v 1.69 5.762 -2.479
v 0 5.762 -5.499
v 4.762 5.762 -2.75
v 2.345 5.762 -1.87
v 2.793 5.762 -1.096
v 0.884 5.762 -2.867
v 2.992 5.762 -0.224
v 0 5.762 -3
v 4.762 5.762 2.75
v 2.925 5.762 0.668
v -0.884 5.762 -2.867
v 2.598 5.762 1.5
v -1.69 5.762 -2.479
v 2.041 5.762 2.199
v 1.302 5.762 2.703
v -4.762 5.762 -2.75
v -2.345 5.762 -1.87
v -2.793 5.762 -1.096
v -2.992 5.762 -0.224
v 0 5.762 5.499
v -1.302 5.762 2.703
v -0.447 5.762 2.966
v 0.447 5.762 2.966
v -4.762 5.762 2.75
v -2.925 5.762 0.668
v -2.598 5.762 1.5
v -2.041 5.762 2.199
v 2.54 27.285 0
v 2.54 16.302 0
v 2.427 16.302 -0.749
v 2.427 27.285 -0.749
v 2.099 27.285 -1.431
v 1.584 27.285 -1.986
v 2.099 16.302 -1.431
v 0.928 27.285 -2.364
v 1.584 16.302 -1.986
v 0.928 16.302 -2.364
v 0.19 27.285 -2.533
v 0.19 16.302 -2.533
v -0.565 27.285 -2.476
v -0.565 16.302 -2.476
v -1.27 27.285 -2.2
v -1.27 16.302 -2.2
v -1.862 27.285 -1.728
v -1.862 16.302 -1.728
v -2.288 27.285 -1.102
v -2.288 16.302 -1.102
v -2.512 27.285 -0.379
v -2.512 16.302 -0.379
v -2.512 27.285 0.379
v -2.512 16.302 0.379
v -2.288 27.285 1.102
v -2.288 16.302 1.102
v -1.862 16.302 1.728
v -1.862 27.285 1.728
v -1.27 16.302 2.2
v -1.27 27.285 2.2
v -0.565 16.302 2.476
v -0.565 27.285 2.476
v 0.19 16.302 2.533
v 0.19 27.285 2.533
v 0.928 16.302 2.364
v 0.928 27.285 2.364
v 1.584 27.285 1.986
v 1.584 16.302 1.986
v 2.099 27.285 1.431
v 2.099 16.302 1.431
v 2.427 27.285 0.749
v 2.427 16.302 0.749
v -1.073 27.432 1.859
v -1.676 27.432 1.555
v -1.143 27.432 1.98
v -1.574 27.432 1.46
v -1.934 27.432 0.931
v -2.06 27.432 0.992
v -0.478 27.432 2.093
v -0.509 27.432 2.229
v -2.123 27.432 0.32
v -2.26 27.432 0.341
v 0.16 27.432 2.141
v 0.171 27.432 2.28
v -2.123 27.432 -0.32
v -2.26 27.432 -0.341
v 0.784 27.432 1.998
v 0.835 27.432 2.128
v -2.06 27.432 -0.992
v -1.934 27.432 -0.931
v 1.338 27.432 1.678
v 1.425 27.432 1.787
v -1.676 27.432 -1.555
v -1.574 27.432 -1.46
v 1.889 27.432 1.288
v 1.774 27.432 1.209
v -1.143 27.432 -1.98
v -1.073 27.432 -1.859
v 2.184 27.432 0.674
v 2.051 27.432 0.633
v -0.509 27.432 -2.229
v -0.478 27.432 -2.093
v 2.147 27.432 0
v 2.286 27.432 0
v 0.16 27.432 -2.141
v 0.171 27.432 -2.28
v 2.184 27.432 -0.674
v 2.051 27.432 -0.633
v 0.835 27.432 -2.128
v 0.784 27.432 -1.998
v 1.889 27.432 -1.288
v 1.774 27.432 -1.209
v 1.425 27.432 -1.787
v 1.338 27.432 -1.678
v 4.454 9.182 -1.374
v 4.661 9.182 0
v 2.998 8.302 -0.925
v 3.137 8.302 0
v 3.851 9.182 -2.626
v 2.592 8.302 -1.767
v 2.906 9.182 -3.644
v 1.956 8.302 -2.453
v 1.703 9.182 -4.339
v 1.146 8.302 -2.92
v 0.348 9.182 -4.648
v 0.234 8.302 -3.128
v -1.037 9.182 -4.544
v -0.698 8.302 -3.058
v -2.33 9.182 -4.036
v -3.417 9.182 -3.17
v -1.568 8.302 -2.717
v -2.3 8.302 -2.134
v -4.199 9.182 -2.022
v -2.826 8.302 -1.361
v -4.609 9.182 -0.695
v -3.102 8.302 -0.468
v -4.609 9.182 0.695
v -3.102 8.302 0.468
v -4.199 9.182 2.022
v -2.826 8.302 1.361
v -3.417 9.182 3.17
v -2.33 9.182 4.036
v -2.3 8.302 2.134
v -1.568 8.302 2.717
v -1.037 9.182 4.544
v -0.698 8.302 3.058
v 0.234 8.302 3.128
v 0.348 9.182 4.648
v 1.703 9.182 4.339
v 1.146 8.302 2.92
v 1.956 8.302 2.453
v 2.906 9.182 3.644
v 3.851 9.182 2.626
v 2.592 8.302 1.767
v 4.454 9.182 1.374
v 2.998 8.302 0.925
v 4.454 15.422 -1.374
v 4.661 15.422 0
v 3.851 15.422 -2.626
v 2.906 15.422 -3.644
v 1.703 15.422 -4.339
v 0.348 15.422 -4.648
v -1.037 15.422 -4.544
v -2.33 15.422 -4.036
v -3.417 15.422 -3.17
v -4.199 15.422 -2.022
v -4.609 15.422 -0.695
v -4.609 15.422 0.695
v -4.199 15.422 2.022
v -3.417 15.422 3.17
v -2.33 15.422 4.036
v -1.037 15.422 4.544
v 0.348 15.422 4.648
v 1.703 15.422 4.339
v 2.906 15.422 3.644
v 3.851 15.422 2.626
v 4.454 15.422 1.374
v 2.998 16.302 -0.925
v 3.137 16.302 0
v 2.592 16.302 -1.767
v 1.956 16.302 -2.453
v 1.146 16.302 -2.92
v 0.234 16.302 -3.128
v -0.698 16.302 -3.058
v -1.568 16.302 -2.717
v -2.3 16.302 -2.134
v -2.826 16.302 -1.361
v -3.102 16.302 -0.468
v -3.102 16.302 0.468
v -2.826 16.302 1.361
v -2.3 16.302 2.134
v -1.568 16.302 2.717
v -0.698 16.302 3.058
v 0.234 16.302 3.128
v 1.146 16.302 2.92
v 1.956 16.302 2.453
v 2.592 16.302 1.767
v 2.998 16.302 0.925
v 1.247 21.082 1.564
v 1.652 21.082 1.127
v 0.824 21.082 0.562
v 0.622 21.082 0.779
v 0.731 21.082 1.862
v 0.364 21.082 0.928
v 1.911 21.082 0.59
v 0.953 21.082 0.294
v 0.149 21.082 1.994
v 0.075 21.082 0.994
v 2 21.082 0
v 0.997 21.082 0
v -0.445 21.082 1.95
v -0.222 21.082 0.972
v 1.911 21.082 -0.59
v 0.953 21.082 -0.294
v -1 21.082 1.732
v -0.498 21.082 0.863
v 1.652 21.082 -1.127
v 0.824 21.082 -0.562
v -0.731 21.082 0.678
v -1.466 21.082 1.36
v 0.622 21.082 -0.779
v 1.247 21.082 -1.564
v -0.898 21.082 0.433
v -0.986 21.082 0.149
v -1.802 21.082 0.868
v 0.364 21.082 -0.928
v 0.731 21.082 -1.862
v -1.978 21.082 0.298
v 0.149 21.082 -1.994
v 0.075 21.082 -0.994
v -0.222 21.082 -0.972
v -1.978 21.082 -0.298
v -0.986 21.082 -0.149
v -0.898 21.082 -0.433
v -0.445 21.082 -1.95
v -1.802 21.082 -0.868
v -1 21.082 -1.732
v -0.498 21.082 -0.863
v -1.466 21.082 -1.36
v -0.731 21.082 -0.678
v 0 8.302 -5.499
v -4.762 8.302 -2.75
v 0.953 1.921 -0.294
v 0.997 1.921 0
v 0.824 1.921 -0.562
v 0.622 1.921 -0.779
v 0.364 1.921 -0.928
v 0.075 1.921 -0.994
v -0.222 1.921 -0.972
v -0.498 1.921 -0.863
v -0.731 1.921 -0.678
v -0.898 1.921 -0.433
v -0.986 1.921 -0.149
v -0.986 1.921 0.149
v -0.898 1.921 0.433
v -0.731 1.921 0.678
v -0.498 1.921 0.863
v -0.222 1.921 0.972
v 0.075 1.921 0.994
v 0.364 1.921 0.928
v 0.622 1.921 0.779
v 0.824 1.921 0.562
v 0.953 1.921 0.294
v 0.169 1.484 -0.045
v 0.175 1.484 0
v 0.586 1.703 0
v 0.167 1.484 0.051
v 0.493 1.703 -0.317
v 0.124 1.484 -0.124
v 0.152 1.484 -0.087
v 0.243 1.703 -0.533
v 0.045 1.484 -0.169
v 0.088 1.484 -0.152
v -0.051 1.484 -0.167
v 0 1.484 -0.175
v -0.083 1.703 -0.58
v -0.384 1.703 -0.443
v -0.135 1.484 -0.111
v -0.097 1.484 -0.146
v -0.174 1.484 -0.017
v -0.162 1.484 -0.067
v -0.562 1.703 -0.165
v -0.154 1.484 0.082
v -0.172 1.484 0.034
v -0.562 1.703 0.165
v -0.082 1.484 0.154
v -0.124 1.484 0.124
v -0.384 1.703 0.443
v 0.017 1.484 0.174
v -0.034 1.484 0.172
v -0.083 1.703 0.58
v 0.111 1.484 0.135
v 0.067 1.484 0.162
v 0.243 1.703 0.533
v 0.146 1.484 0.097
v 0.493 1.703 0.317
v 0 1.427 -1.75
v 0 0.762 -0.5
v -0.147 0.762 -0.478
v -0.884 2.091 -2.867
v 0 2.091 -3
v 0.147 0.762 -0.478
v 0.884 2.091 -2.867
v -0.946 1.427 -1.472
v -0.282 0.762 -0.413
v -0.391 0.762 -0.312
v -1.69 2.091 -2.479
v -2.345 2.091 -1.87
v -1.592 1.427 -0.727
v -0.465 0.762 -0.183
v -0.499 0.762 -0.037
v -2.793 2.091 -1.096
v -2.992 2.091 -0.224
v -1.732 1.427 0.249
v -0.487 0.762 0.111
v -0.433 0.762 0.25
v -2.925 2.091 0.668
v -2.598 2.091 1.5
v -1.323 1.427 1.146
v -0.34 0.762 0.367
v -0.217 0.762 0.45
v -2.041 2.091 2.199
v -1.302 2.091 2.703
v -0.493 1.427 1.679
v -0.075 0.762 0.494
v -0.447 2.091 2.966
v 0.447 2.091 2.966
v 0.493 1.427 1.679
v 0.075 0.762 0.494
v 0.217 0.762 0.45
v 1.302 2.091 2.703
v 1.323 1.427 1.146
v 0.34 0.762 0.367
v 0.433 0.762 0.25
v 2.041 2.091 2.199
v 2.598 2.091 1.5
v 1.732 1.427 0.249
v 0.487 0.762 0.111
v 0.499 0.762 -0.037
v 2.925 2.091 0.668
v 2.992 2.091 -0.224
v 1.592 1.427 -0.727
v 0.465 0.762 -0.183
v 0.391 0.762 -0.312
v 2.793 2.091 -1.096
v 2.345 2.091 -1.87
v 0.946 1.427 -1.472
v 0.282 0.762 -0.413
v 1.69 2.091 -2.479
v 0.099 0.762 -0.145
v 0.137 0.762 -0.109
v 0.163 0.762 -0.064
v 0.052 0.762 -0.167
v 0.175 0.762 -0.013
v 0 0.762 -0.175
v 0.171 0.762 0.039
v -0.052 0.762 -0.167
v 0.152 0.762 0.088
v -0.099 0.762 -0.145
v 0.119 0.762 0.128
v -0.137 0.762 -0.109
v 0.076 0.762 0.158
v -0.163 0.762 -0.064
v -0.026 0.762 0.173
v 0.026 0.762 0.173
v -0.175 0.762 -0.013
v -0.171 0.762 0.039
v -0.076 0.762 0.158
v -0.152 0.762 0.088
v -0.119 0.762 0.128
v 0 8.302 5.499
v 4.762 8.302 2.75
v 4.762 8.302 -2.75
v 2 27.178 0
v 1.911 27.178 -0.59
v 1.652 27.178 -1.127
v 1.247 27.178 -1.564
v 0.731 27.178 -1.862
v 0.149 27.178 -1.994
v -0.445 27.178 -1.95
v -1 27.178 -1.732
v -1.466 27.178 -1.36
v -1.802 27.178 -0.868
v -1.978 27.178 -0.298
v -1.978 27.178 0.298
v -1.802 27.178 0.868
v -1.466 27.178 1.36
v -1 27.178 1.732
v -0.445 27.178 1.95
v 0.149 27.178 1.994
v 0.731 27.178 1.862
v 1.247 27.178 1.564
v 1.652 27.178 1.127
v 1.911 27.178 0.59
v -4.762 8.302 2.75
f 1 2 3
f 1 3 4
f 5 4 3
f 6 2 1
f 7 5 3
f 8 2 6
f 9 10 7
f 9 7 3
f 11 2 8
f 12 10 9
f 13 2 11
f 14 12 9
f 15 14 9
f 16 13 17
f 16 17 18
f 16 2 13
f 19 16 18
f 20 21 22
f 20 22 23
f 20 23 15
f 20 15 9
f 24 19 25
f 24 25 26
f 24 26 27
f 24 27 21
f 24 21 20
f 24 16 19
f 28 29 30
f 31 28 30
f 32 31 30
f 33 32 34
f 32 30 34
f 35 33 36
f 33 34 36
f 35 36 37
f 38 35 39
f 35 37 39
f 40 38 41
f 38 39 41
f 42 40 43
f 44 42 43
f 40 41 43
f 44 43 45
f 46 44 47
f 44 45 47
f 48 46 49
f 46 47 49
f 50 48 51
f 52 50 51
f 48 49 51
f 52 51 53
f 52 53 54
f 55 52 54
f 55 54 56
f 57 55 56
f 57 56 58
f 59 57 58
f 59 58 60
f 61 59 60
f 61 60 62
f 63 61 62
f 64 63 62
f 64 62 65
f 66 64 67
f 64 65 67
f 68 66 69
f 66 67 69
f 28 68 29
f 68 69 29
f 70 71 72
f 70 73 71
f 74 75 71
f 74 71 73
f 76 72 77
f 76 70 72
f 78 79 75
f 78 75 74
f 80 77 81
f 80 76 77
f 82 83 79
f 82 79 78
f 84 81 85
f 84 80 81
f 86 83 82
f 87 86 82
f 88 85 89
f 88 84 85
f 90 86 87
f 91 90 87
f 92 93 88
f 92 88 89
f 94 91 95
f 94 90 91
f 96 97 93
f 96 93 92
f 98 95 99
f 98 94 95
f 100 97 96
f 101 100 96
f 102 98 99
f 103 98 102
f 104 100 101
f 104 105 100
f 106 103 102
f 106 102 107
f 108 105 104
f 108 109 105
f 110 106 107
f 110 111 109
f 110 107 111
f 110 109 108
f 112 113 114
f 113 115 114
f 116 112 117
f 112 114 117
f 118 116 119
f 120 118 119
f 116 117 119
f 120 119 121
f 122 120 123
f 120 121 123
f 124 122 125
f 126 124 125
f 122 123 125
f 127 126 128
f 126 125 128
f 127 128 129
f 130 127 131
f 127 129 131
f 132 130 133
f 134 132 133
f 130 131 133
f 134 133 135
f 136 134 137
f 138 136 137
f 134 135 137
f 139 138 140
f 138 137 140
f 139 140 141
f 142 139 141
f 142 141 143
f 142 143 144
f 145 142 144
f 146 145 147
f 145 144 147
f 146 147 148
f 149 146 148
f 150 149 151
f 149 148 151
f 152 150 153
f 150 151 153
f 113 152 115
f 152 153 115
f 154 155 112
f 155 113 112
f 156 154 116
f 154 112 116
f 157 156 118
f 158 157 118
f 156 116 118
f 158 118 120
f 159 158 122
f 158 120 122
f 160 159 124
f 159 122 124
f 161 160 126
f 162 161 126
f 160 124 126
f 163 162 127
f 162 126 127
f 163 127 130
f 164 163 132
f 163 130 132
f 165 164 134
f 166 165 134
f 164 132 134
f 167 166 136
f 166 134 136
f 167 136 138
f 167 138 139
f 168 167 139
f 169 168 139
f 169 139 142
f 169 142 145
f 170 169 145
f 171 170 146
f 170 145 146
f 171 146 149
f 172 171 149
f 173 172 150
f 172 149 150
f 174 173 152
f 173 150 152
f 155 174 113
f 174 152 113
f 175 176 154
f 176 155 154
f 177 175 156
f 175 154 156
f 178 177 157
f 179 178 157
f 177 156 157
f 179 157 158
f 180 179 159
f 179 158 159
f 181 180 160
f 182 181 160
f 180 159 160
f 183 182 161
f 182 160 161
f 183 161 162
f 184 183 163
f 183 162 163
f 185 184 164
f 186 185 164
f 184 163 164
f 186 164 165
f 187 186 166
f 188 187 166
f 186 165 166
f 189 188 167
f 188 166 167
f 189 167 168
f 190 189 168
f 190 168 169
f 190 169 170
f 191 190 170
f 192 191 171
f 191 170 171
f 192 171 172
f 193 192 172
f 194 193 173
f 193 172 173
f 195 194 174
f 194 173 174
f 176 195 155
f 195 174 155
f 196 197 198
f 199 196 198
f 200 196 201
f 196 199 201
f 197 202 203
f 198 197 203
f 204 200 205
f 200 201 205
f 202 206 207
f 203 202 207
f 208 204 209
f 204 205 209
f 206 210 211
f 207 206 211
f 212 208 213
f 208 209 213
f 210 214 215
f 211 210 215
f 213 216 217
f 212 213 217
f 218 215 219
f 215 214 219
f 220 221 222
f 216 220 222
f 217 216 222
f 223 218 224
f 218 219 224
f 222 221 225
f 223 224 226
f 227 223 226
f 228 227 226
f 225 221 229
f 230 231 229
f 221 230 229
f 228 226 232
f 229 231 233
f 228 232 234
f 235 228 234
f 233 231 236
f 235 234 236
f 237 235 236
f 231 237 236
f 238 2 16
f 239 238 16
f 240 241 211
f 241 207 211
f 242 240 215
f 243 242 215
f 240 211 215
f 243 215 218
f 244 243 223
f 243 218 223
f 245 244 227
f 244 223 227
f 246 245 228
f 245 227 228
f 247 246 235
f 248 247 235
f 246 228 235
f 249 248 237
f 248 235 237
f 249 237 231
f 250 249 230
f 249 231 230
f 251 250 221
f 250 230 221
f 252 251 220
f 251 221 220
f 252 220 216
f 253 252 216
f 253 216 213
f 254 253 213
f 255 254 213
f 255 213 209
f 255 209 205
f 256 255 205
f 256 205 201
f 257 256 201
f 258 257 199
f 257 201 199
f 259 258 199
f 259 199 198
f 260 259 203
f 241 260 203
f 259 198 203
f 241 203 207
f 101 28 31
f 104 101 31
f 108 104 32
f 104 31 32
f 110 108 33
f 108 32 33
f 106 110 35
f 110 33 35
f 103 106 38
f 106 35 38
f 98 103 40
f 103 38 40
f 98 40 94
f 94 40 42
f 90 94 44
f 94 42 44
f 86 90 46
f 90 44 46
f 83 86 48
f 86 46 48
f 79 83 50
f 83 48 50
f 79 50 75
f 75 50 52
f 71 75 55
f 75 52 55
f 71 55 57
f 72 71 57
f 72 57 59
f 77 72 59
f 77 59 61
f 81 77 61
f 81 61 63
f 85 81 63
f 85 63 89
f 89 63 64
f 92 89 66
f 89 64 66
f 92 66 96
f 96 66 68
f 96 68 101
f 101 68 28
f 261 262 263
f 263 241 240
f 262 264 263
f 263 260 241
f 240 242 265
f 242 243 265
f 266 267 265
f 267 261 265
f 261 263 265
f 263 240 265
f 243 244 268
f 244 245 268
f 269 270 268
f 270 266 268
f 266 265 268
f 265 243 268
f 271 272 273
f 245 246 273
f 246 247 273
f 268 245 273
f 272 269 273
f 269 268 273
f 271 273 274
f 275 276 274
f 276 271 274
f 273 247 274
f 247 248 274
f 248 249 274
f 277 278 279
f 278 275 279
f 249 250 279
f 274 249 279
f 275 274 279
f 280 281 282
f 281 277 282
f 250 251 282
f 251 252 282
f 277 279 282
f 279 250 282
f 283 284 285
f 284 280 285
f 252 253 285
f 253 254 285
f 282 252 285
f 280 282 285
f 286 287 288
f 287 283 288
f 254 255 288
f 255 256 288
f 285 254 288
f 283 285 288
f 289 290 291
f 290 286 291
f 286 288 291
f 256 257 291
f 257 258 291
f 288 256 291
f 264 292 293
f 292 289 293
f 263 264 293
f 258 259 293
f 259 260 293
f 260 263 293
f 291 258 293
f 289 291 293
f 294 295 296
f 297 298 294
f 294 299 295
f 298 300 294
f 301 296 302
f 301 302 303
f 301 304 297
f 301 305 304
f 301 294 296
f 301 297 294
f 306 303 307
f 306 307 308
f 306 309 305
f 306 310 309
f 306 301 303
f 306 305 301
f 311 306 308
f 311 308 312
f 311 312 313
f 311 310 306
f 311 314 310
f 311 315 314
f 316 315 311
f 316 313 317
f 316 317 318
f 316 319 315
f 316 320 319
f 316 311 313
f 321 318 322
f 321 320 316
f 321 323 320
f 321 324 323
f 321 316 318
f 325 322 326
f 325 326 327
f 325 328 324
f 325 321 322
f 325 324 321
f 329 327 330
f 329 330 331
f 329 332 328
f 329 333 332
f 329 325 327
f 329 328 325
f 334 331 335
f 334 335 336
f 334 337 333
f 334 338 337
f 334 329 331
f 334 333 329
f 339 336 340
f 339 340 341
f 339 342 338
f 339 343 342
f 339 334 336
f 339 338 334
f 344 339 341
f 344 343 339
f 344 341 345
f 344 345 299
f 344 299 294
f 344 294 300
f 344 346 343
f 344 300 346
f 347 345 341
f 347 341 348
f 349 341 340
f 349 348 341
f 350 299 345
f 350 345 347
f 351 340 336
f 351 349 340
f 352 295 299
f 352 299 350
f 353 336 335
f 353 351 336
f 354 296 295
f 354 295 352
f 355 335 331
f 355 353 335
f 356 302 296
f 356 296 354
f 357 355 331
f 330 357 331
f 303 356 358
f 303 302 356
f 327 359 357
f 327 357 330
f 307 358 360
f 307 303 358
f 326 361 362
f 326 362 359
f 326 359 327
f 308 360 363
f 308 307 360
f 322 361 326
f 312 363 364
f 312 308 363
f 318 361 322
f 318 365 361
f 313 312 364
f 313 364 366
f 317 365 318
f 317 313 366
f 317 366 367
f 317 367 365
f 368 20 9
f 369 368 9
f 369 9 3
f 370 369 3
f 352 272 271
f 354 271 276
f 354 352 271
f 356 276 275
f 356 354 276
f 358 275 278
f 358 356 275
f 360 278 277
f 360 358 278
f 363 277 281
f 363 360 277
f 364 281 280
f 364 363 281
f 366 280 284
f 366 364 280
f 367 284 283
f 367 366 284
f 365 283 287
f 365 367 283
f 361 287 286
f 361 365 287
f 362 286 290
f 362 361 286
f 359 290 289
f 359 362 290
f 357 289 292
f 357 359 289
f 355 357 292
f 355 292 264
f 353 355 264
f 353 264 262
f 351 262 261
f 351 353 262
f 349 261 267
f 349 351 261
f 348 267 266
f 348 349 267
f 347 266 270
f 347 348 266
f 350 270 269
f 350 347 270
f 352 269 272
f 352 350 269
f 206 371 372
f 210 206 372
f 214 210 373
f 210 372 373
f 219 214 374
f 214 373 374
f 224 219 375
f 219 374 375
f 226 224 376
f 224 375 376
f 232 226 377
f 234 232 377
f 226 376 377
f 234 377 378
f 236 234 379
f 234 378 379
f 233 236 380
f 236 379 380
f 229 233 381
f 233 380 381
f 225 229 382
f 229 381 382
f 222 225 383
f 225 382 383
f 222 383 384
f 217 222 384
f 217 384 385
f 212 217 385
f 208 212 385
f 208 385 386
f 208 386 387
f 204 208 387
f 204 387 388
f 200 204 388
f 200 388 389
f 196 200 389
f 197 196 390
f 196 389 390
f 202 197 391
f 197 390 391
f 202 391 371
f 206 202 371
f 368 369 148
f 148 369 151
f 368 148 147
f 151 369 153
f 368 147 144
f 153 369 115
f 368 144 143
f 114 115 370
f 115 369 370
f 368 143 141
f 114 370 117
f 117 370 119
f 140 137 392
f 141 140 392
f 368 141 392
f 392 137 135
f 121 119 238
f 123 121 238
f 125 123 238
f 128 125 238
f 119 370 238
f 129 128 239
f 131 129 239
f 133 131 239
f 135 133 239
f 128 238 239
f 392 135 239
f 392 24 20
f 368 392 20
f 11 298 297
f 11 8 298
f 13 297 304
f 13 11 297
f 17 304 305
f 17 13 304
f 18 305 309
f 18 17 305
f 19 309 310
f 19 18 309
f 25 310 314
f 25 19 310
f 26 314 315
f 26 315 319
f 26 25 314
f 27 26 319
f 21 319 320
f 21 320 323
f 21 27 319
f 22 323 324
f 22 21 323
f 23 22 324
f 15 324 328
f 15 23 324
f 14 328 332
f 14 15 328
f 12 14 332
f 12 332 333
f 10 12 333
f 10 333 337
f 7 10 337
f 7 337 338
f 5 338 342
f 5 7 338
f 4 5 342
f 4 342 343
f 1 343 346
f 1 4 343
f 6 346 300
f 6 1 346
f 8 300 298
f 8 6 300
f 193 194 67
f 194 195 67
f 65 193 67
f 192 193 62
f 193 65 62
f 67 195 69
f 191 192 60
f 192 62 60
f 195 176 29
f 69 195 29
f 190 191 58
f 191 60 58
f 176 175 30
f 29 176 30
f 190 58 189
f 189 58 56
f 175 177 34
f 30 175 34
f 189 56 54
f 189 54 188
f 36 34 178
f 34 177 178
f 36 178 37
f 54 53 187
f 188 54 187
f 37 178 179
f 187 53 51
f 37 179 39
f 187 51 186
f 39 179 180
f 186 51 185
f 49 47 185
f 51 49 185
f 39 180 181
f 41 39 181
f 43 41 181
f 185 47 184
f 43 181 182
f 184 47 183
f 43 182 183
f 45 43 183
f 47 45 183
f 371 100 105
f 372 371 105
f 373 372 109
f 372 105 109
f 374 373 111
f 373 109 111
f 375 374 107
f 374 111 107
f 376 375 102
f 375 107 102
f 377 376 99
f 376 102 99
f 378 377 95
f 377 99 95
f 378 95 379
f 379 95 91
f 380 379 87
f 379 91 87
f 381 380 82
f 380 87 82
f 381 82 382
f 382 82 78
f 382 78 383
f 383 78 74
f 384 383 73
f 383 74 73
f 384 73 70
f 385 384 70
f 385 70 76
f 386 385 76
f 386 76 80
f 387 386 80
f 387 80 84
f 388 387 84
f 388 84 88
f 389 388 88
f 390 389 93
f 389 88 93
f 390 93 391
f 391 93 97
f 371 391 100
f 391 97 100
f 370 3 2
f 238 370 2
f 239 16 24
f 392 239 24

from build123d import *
from OCP.BRepFilletAPI import BRepFilletAPI_MakeChamfer

# Parameters (mm, degrees)
BOSS_EXTRUDE1_DEPTH = 27.432
CHAMFER1_SIZE       = 0.254
CHAMFER1_SIZE2      = 0.146646968


# Read off the part's stored shape, not the designer's step: Cut-Revolve4
with BuildPart() as part:
    # Sketch3 → Boss-Extrude1 (new body)
    with BuildSketch(Plane(origin=(0, 0, 0), x_dir=(1, 0, 0), z_dir=(0, 1, 0))):
        Polygon((4.7625, 2.749630657), (0, 5.499261314), (-4.7625, 2.749630657), (-4.7625, -2.749630657), (0, -5.499261314), (4.7625, -2.749630657), align=None)
    extrude(amount=BOSS_EXTRUDE1_DEPTH)

    # Cut-Revolve4 outline → Cut-Revolve4 (revolve, cut)
    with BuildSketch(Plane.XY):
        Polygon((4.6609, 9.18188181), (3.1369, 8.302), (5.499261314, 8.302), (5.499261314, 27.432), (2.54, 27.432), (2.54, 16.302), (3.1369, 16.302), (4.6609, 15.42211819), align=None)
        Polygon((0.99695, 21.082), (2, 21.082), (2, 27.432), (0, 27.432), (0, 1.391072642), (0.99695, 1.92116036), align=None)
    revolve(axis=Axis((0, 0, 0), (0, 1, 0)), mode=Mode.SUBTRACT)

    # Chamfer1: one chamfer whose edges measure the first distance from different faces: ONE call of the kernel's chamfer builder (chamfer() names one face for all edges)
    chamfer1_edges_1 = [part.edges().sort_by_distance(p)[0] for p in [
        (-2.54, 27.432, 0),
    ]]
    chamfer1_side_1 = [part.faces().sort_by_distance(p)[0] for p in [
        (-2.468157951, 27.432, 0),
    ]]
    chamfer1_edges_2 = [part.edges().sort_by_distance(p)[0] for p in [
        (-2, 27.432, 0),
    ]]
    chamfer1_side_2 = [part.faces().sort_by_distance(p)[0] for p in [
        (-2, 24.257, 0),
    ]]
    chamfer1 = BRepFilletAPI_MakeChamfer(part.part.solid().wrapped)
    for e in chamfer1_edges_1:
        chamfer1.Add(CHAMFER1_SIZE, CHAMFER1_SIZE2, e.wrapped, chamfer1_side_1[0].wrapped)  # the first distance lies on this face
    for e in chamfer1_edges_2:
        chamfer1.Add(CHAMFER1_SIZE, CHAMFER1_SIZE2, e.wrapped, chamfer1_side_2[0].wrapped)  # the first distance lies on this face
    add(Compound.cast(chamfer1.Shape()), mode=Mode.REPLACE)

    # Sketch4 → Cut-Revolve5 (revolve, cut)
    with BuildSketch(Plane.XY, mode=Mode.PRIVATE) as cut_revolve5_sk:
        Polygon((-0.175, 0.762), (-0.5, 0.762), (-3, 2.091273579), (-3, 5.762), (-6.107414125, 5.762), (-6.107414125, 0), (0, 0), (0, 1.524), (-0.175, 1.524), align=None)
    revolve(cut_revolve5_sk.sketch.rotate(Axis((0, 0, 0), (0, 1, 0)), 270), axis=Axis((0, 0, 0), (0, 1, 0)), mode=Mode.SUBTRACT)


solid = part.part
